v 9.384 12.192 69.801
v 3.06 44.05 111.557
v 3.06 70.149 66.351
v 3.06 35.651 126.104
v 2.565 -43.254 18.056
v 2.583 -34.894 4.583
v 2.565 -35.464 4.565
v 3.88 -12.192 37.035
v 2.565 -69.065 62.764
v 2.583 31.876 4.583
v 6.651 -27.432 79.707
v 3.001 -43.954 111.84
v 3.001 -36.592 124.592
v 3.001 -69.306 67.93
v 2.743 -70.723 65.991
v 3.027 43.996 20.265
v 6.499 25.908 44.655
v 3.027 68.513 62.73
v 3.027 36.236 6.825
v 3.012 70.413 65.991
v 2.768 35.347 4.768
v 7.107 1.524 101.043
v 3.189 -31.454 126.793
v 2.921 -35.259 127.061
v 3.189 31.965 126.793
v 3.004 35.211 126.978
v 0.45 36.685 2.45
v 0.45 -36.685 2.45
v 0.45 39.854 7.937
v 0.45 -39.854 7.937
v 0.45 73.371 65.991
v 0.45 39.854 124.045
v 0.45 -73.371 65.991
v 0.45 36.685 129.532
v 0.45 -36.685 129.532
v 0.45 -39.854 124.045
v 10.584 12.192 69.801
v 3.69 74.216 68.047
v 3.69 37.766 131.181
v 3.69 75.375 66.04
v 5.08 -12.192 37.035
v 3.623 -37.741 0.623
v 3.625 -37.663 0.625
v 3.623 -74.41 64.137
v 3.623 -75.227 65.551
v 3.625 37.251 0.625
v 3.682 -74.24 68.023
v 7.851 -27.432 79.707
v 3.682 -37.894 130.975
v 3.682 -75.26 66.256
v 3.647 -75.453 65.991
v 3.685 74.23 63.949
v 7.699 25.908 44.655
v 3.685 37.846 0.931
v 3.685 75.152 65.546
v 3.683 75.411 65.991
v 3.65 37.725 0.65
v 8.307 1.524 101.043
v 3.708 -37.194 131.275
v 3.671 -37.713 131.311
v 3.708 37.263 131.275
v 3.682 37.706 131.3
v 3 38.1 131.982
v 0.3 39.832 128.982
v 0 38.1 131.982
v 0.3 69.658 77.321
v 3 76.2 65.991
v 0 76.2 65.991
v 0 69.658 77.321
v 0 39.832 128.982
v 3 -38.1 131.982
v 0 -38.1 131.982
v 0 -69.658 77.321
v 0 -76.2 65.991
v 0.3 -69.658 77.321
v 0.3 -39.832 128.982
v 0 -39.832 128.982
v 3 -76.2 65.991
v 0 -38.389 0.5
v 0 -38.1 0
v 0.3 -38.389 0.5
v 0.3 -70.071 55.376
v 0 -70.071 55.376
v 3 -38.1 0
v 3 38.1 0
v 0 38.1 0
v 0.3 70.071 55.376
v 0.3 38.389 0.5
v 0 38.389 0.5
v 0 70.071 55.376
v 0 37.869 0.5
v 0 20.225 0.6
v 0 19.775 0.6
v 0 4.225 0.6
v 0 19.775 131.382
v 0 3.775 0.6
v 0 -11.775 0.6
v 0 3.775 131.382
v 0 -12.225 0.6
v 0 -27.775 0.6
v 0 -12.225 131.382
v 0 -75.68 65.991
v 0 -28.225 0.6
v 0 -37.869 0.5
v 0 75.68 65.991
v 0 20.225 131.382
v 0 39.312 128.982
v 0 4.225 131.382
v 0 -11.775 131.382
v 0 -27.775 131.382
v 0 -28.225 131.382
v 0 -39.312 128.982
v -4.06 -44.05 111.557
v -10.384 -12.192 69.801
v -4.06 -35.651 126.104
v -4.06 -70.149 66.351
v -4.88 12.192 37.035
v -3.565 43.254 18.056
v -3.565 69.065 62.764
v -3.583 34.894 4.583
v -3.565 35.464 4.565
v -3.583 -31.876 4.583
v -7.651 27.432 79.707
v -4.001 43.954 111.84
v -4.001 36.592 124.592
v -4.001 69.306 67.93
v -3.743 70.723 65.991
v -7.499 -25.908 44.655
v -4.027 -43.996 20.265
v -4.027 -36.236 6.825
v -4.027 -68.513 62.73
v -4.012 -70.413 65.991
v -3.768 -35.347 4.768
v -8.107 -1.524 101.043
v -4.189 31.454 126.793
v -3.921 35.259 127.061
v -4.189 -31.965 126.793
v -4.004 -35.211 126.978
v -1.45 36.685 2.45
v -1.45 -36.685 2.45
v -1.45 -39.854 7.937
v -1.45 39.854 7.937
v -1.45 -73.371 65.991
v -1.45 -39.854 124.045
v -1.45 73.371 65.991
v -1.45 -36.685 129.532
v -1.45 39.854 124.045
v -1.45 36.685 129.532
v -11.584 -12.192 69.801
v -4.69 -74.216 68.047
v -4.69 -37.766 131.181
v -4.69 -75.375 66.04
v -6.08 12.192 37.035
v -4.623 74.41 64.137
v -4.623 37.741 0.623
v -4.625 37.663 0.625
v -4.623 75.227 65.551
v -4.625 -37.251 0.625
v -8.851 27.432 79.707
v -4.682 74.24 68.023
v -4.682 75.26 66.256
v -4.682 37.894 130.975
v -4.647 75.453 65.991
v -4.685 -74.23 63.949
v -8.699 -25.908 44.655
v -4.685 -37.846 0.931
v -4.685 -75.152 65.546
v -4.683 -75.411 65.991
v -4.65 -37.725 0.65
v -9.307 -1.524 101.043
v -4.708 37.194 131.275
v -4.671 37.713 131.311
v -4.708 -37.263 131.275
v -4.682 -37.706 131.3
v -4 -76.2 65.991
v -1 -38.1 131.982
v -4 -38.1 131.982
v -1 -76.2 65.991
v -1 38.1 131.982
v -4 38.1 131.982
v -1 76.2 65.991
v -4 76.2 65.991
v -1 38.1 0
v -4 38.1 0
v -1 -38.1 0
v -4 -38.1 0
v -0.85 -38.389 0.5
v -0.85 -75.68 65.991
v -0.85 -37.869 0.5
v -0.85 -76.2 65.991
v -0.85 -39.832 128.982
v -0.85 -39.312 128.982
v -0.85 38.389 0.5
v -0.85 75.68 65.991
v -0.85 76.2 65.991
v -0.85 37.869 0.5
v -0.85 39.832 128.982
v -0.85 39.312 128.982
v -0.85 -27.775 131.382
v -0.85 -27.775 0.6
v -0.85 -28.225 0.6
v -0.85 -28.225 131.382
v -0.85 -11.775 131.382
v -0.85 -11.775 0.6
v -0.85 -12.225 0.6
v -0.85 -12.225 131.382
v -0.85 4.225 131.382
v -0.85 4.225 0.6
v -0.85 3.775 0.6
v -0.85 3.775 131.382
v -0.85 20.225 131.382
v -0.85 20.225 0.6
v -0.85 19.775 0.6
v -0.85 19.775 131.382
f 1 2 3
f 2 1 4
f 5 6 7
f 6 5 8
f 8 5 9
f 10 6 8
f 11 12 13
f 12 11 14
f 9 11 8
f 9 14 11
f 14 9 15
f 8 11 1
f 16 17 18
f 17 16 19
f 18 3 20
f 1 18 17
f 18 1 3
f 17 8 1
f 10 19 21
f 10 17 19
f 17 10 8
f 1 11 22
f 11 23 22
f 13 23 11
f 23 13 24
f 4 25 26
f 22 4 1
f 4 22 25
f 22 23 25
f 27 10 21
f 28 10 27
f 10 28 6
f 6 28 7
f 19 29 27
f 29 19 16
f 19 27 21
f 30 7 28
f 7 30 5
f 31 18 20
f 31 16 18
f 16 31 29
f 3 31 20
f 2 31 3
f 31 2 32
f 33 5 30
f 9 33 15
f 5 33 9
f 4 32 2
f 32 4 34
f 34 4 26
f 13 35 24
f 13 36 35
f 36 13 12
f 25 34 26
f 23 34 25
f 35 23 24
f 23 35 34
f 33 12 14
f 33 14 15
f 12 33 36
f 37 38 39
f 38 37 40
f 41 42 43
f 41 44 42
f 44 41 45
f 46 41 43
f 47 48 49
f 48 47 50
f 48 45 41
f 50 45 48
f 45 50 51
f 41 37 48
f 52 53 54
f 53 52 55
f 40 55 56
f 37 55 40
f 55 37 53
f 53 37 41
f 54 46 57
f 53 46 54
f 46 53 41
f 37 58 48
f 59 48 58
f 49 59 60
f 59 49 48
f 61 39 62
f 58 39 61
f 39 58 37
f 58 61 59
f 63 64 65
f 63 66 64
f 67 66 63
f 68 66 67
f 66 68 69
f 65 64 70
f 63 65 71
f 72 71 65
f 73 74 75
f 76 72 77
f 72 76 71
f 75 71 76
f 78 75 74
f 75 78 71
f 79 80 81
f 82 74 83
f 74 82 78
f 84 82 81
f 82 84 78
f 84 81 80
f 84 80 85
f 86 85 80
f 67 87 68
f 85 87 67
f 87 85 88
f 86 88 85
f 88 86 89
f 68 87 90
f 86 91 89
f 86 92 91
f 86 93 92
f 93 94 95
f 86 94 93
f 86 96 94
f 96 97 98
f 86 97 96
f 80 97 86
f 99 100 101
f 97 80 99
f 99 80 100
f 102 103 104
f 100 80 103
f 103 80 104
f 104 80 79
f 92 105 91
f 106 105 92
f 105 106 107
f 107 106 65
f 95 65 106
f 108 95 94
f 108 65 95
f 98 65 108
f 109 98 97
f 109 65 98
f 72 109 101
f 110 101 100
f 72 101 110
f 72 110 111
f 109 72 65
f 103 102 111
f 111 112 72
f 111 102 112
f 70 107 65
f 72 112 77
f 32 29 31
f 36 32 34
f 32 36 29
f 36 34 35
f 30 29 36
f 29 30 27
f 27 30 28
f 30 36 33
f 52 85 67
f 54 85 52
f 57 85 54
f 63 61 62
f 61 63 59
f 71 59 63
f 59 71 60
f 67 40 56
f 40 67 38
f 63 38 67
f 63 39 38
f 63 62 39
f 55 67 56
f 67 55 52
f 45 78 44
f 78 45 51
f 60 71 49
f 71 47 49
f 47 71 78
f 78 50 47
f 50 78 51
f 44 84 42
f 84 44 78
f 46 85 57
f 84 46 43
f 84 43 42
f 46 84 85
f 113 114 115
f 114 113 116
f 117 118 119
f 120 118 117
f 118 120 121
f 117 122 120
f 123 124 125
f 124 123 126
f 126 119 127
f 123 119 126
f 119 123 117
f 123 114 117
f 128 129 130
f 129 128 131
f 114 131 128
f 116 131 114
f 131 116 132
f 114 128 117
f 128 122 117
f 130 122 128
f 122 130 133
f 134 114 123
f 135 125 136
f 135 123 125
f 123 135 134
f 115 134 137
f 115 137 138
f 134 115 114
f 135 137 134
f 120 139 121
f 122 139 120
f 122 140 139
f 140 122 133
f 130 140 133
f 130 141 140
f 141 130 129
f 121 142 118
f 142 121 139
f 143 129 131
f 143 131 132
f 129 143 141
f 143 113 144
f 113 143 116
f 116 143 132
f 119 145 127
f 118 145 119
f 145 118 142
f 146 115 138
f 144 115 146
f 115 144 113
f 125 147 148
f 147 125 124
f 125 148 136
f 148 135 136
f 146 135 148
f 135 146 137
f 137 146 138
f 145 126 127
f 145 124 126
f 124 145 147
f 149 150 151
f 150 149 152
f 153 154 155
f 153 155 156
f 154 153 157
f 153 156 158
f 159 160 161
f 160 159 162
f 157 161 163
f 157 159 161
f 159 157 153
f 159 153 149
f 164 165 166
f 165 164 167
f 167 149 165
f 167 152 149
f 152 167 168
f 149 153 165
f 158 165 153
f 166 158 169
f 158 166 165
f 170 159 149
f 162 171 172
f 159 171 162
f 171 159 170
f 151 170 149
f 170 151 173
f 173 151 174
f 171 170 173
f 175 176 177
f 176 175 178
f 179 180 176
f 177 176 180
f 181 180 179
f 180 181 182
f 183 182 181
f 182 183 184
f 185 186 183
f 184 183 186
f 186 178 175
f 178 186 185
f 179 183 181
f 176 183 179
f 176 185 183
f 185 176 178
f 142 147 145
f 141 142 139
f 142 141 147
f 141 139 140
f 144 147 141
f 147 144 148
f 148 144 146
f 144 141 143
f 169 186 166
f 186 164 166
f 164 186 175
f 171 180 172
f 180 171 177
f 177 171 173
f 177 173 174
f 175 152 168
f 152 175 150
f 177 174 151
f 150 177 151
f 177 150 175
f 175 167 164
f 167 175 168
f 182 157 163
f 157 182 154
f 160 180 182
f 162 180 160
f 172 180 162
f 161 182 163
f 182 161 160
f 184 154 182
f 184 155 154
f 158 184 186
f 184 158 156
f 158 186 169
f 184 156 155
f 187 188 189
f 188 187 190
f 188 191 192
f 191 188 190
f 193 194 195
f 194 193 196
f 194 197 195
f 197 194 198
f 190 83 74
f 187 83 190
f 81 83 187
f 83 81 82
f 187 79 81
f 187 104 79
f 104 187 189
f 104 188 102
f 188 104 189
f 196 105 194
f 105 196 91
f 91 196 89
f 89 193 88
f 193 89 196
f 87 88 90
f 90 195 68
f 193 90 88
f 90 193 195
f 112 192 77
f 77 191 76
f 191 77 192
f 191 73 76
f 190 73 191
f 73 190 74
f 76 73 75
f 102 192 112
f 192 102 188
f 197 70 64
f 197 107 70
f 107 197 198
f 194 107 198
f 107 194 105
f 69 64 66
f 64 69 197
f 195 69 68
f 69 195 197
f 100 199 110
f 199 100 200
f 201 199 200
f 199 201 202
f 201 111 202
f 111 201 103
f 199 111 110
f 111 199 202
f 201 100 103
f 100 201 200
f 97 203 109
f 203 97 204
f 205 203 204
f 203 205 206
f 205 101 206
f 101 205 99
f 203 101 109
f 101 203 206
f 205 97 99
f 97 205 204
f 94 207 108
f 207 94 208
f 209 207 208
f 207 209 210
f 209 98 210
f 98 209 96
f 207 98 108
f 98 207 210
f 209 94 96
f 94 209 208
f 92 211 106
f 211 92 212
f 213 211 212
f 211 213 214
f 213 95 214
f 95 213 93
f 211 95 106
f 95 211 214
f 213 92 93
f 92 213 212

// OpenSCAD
// Hexagon wall tile v57 — parametric rebuild of v30
// Front: identical low-poly facets to v30 (same facet angles at every size).
// Edge profile: identical on every size (edge depth, rim width) so tiles butt flush.
// Back: six corner pads for 1" (25 mm) double-sided mounting tape.
// v32: tape pads are flat plates hung from the rim with an air gap to the front skin.
// v33: thinner skin + thinner pads so the air gap is 1.4 mm even right at the edges
//      (v32 had only 0.8 mm there and showed marks along the slanted edges).
// v34: snap-off stabilizer fins behind the bottom edge so the tall, thin tile can't tip over
//      while printing. Break them off afterwards (bend sideways) and the back stays flat.
// v35: 0.6 mm 45° chamfer on the front edge (crisp, consistent shadow line between tiles; hides
//      first-layer squish and brim trim marks) + relief_scale to deepen the facets if wanted.
// v37: much smaller breakaway tabs (0.8 x 0.6 mm, every 8 mm) so the fins snap off easily.
// v38: full-height snap-off BRACE FRAME behind the tile: a thin hex ring + X/vertical bars,
//      1 mm behind the back, tied to the tile rim by tiny tabs all the way round (incl. the top).
//      Tile + brace act as a stiff box while printing; the fins now sit on the brace.
//      Peel the brace off after printing — the tabs only touch the back rim.
// v39: PAIR mode (default): two identical tiles printed back-to-back, 0.4 mm apart, so each
//      cradles the other full-height. Only 12 tiny tabs (corners + mid-sides) join the back
//      rims — twist/peel the tiles apart. No brace, no fins, almost no waste. The pair is
//      turned 90° on the bed so the 'back' seam lands on a side edge, not on either face.
// v40: pair tabs spaced evenly every ~pair_tab_pitch mm round the rim on EVERY size. In v39 the
//      tab spacing grew with the tile (3": ~23 mm max gap, 6": ~46 mm, 10": ~79 mm), so the 3" pair
//      printed perfectly but the 6" rims flexed apart between tabs and broke up above mid-height.
//      Now every size has the same tab spacing as a stiff 3" pair (or tighter).
// v42: tabs replaced by one continuous hairline SEAM round the outer edge of the pair gap.
//      Discrete tabs changed the toolpath on every layer that had a tab, leaving a faint line
//      across the tile every ~10 mm of height. With a continuous seam every layer has the same
//      shape, so there is nothing to print differently. Separate the tiles by running a utility
//      knife along the seam line on the edges, then twist apart.
// v43: stiffer tape pads — each pad now grows from the back plane toward the front until it is
//      pad_gap (1.4 mm) from the skin, instead of being a 1 mm plate (the skin stays untouched, so
//      no ghost lines). Larger tiles (>= mid_pad_min_in)
//      get four extra pads at the slanted mid-edges: 10 tape spots on the 10".
// v44: UNIFORM pads. Every pad is the same PAD x PAD tape square, pushed snug into its corner
//      (touching both rims), with only a small 45° gusset beneath it down to the rim so it prints
//      without support. Because a hex corner is the same angle at every size, the 6" and 10" pads
//      are identical in shape and size; the 3" uses the same layout with smaller squares.
//      The 10" adds the same square at the middle of each slanted edge.
// v46: pads are a 1 mm plate with a stiffening LIP round the free edges (like a shallow tray),
//      instead of solid-filled — nearly the stiffness of v44's deep pads at close to v42 print time.
// v47: pair gap 0.4 -> 1.0 mm. At 0.4 mm the squashed back walls of the two tiles touched and
//      fused, so v42-v46 pairs would not come apart. At 1.0 mm only the hairline edge seam joins
//      them: cut it with a utility knife (there is now room for the blade) and they separate.
// v48: seam only on the four SLANTED edges. The top and bottom flat edges are left open (a 1 mm
//      slot), so a putty knife / flat screwdriver can go in and pry the pair open, unzipping the
//      seam. Every layer still crosses the seam at both ends, so the layer shape stays constant.
// v49: "KISS" seam — the seam is printed on ONE tile only and stops seam_kiss short of the other
//      tile's back. The two tiles are never one solid: they only touch where the plastic squashes
//      out, which tacks them lightly (enough to steady them while printing, weak enough to snap by
//      hand). Set seam_kiss = 0 to go back to the fused v48 seam.
// v50: (1) every tape pad gets a 45° pointed top, so pads taper out over many layers instead of
//      ending on one layer. Abrupt pad ends changed the layer time suddenly and left a line across
//      the face (seen at ~14% and ~36% height on the 10").
//      (2) the stiffening lips stay lip_gap (2.5 mm) clear of the skin, not 1.4: near the edges the
//      lips were hugging the skin and ghosting through as ridges parallel to the edge.
// v51: STIFFER, LARGER TAPE PADS without touching the front edge profile:
//      - each tape SQUARE stands pad_proud (1.2 mm) proud of the back rim, so where the tape goes
//        the pad is ~2.2 mm thick (was 1 mm) — roughly 8-10x stiffer. The tile sits on its pads;
//        the rim floats ~1.2 mm + tape thickness off the wall. Support webs stay thin (print time).
//      - pads 30 mm square (fit 1" tape with margin), with a shallow 30° roof instead of a point.
//      - front kept cleaner: pads now stay pad_gap = 1.6 mm from the skin; no lips.
//      - pair gap grows to keep 1 mm between the two tiles' proud pads.
//      - seam now starts right at the bottom corners (no cantilevered start); pry slot along the top.
// v53: seam is FUSED (one printed line) on the two upper slanted edges and stays a light-contact
//      kiss seam on the lower two. The top half is where the pair wobbled (ripples near the top
//      corners); the switch happens at mid-height, where the hex corners already turn.
//      Separate: knife in the top slot, run down both upper edges, twist apart.
// v54: tape squares 0.6 mm proud (was 1.2): ~1.6 mm thick, still ~4x stiffer than v50's 1 mm
//      plates, and about 1 hour less on a 10" pair. Print time goes to the face instead.
// v57: CLOSED BACK + FULL-HEIGHT BREAKAWAY RIBS.
//      - each tile gets a flat back plate (back_t thick, always >= back_gap from the skin), so the
//        tile is a stiff closed box instead of an open shell; tape goes anywhere on the flat back.
//      - the two backs are joined by thin vertical ribs (print direction) every rib_pitch mm across
//        the middle. Each rib runs bed-to-top, so every layer has the same shape (no face lines),
//        and each rib stops rib_kiss short of the partner tile -> they only tack, twist apart.
//      - edge seam is a uniform light-contact seam again (no mid-height change).
// Prints upright on a flat edge with NO supports (every downward edge is 45° or steeper).
//
// Export one size at a time, e.g.:
//   openscad -D size_in=6 -o hex_pair_v57_6in.stl hex_wall_tile_v57.scad

/* [Size] */
size_in       = 6;      // point-to-point width in inches (3, 6, 10 ...)

/* [Edge profile — keep identical across sizes] */
// Space behind the skin at the edge = edge_depth - skin; it must be >= pad_plate + pad_gap + pad_recess.
edge_depth    = 3.6;    // depth of the outer edge, back plane to front face (mm)
rim           = 2.0;    // perimeter wall thickness at the back plane (mm)
front_chamfer = 0.6;    // 45° chamfer on the front edge (mm); 0 = sharp edge

/* [Look] */
relief_scale  = 1.0;    // 1.0 = v30 facets; 1.5 = 50% deeper facets (same edge profile on all sizes)

/* [Front skin] */
skin          = 1.2;    // front skin thickness (mm) — 3 lines at 0.4 mm, same on all sizes

/* [Tape pads] */
tape_width    = 25.4;   // tape width (mm)
pad_margin    = 5;      // extra pad width beyond the tape (mm) -> 30.4 mm pads
pad_max_frac  = 0.45;   // pad never larger than this fraction of the tile radius (keeps 3" usable)
pad_plate     = 1.0;    // pad thickness in front of the back plane (mm), less where the skin is close
pad_proud     = 0;      // pads stand this far behind the back rim (mm) -> extra stiffness, no effect on the front
roof_angle    = 30;     // slope of the pad tops (deg) — tapers the pad end over several mm of height
pad_depth     = 0;         // stiffening lip depth (mm); always stops pad_gap from the skin
lip_gap       = 2.5;    // lips stop this far from the skin (plates keep pad_gap)
pad_lip       = 0.9;    // lip thickness (mm) — two lines
mid_pad_min_in = 8;     // tiles this size or larger also get pads at the four slanted mid-edges
pad_gap       = 1.6;    // minimum air gap between pads and the front skin (mm) — keeps the front clean
pad_recess    = 0;      // pads set back from the rim (mm); >0 lets the rim touch the wall,
                        // but near the edges the plate is then trimmed thinner to keep pad_gap

/* [Print stabilizers (snap off after printing)] */
stabilizers   = false;  // v34-v38 option; not needed in pair mode
fin_count     = 2;      // fins behind the bottom edge, placed symmetrically
fin_thick     = 1.6;    // fin thickness (mm)
fin_height_frac = 0.35; // fin height as a fraction of the tile height
fin_depth_frac  = 0.4;  // fin depth behind the brace as a fraction of fin height
fin_depth_min   = 15;   // (mm)
fin_gap       = 0.5;    // air gap between fin and tile back (mm)
tab_height    = 0.6;    // breakaway tab height (mm, vertical when printing) — 3 layers at 0.2
tab_width     = 0.8;    // breakaway tab width (mm), centred on the fin — 2 lines
tab_pitch     = 8;      // spacing between tabs (mm)

/* [Full-height brace frame (snap off after printing)] */
brace         = false;  // v38 option; not needed in pair mode
brace_gap     = 1.0;    // air gap between tile back and brace (mm)
brace_thick   = 1.6;    // brace thickness (mm)
brace_rim_w   = 4;      // width of the brace's hex ring (mm)
brace_bar_w   = 3;      // width of the X and vertical bars (mm)
brace_tab_pitch = 10;   // spacing of brace tabs along each rim side (mm)
brace_tab     = 0.8;    // brace tab size (mm) — tiny, so the brace peels off

/* [Back-to-back pair (default)] */
pair          = true;
pad_clear     = 1.0;    // air between the two tiles' proud pads (mm)
pair_gap      = pad_clear + 2*pad_proud;   // gap between the two back planes (mm)
pair_tab      = 0.6;    // tab size (mm) — tiny, so the pair twists apart
pair_tab_pitch = 12;    // (v40 tabs, unused when pair_seam_w > 0)
pair_seam_w   = 0.45;   // width of the continuous edge seam bridging the gap (mm) — about one line
seam_kiss     = 0.15;   // gap between the seam tip and the other tile (mm); 0 = fused seam
upper_fused   = false;  // v53: fuse the seam on the two upper slanted edges only
seam_open     = 3;      // leave the seam off this far from the top and bottom flat edges (mm) -> pry slots

/* [Closed back + ribs (v57)] */
closed_back   = true;
back_t        = 0.45;   // back plate thickness (mm) — one 0.4 line (keeps the 10" pair under ~9 h)
back_gap      = 1.6;    // back plate never closer than this to the skin (mm)
ribs          = true;
rib_w         = 0.45;   // rib width (mm) — one line
rib_pitch     = 16;     // rib spacing (mm)
rib_kiss      = 0.15;   // rib stops this far from the partner's back (mm); 0 = fused

/* [Output] */
orient_for_print = true; // stand upright on a flat edge, back facing +Y

/* [Hidden] */
R   = size_in * 25.4 / 2;         // corner radius
AP  = R * cos(30);                // apothem
PAD = min(tape_width + pad_margin, R * pad_max_frac);

// Normalised front geometry from v30 (x, y in units of R; z = relief above edge, units of R)
FP = [[1,0,0],[0.5,0.866025,0],[-0.5,0.866025,0],[-1,0,0],[-0.5,-0.866025,0],[0.5,-0.866025,0],
      [0.16,0.05,0.091654],[-0.16,-0.38,0.019428],[-0.36,0.18,0.05579],[0.34,-0.28,0.053795],[0.02,0.46,0.061766]];
FACES = [[0,6,1],[4,3,7],[5,4,7],[8,3,2],[7,3,8],[7,8,6],[5,9,0],[9,6,0],[9,7,6],[5,7,9],
         [6,8,10],[8,2,10],[6,10,1],[10,2,1],
         [1,12,11,0],[2,13,12,1],[3,14,13,2],[4,15,14,3],[5,16,15,4],[0,11,16,5],
         [11,12,13,14,15,16]];
RELIEF_MAX = 0.091654 * R * relief_scale;
D = edge_depth + RELIEF_MAX + 1;  // max depth used for chamfers

// Solid bounded by the faceted front (shifted by dz) and a flat back at z = zb
module body(dz = 0, zb = 0) {
    pts = concat(
        [for (p = FP) [p[0]*R, p[1]*R, edge_depth + p[2]*R*relief_scale + dz]],
        [for (i = [0:5]) [FP[i][0]*R, FP[i][1]*R, zb]]);
    polyhedron(points = pts, faces = FACES, convexity = 4);
}

module hex2d(apothem) { circle(r = apothem / cos(30), $fn = 6); }

// Back cavity: behind the skin, inside the rim; rim inner faces slope 45° so nothing needs support
module cavity(extra = 0) {
    H  = D + 2;
    a0 = AP - rim - extra + 1;             // apothem at z = -1
    intersection() {
        body(dz = -skin - extra, zb = -1);
        translate([0, 0, -1]) linear_extrude(height = H, scale = (a0 - H) / a0) hex2d(a0);
    }
}

// ---- Uniform tape pads ----------------------------------------------------------------
PA = AP - rim + 0.3;                    // inner apothem used for pads (0.3 mm overlap fuses them to the rim)
PH = PAD / 2;
function nrm(a) = [cos(a), sin(a)];
function lim(a) = PA - PH * (abs(cos(a)) + abs(sin(a)));     // max n.c for an axis-aligned PAD square
// centre of a PAD square snug in the corner at angle t (touches the two rims meeting there)
function corner_c(t) = let(n1 = nrm(t - 30), n2 = nrm(t + 30), b1 = lim(t - 30), b2 = lim(t + 30), d = sin(60))
    [(b1*n2[1] - b2*n1[1]) / d, (n1[0]*b2 - n2[0]*b1) / d];
// centre of a PAD square snug against the middle of the edge whose normal is at angle a
function edge_c(a) = lim(a) * nrm(a);
// downward 45° (or vertical) gusset direction toward the nearest rim below — printed upright, model -y is down
function gdir(t) = (cos(t) > 0.1) ? [1, -1] : (cos(t) < -0.1) ? [-1, -1] : [0, -1];

module pad_sq(c, dir) {
    intersection() {
        hex2d(PA);
        hull() {
            translate(c) square(PAD, center = true);
            translate(c + [0, PAD/2 + PAD/2*tan(roof_angle)]) square(0.01, center = true);   // shallow roof
            translate(c + dir * R) square(PAD, center = true);
        }
    }
}
module pad_fp(k)  { t = 60*k;      pad_sq(corner_c(t), (k == 4 || k == 5) ? [0, -1] : gdir(t)); }
module mid_fp(k)  { a = 30 + 60*k; pad_sq(edge_c(a),   (k == 3 || k == 5) ? [0, -1] : gdir(a)); }

module pad_fps() {
    for (k = [0:5]) pad_fp(k);
    if (size_in >= mid_pad_min_in) for (k = [0, 2, 3, 5]) mid_fp(k);
}
// proud part of one tape square: only the square itself (not its support web), with a 45° ramp
// at its lower edge so, printed upright, it grows out of the plate instead of starting as a ledge
module proud_sq(c) {
    intersection() {
        translate([0, 0, -pad_proud]) linear_extrude(pad_proud + 0.01)
            intersection() {
                hex2d(PA);
                hull() { translate(c) square(PAD, center = true);
                         translate(c + [0, PAD/2 + PAD/2*tan(roof_angle)]) square(0.01, center = true); }
            }
        translate([0, c[1] - PAD/2, 0])
            multmatrix([[1,0,0,0],[0,1,-1,0],[0,0,1,0]]) translate([-2*R, 0, -5]) cube([4*R, 4*R, 10]);
    }
}
module pads() {
    intersection() {                                       // tape plate in front of the back plane, pad_gap from the skin
        body(dz = -skin - pad_gap, zb = -1);
        linear_extrude(pad_plate) pad_fps();
    }
    for (k = [0:5]) proud_sq(corner_c(60*k));              // stiff proud tape squares behind it
    if (size_in >= mid_pad_min_in) for (k = [0, 2, 3, 5]) proud_sq(edge_c(30 + 60*k));
}

module chamfer_clip() {
    HB = D + 5;
    union() {
        translate([0, 0, -2]) linear_extrude(edge_depth - front_chamfer + 2) hex2d(AP + 1);
        translate([0, 0, edge_depth - front_chamfer]) linear_extrude(height = HB, scale = (AP - HB) / AP) hex2d(AP);
    }
}

module tile() {
    intersection() {
        union() {
            difference() { body(); cavity(); }
            if (closed_back) intersection() {                    // flat back plate, clear of the skin
                body(dz = -skin - back_gap, zb = -1);
                linear_extrude(back_t) hex2d(AP - rim + 0.3);
            }
            else pads();
        }
        if (front_chamfer > 0) chamfer_clip(); else translate([-2*R, -2*R, -5]) cube([4*R, 4*R, 4*R]);
    }
}

// Triangular fins standing on the bed behind the back (model z < 0), joined to the tile by small tabs
FIN_H = fin_height_frac * 2 * AP;
FIN_L = max(fin_depth_min, fin_depth_frac * FIN_H);
function fin_x(i) = (fin_count == 1) ? 0 : (-1 + 2 * i / (fin_count - 1)) * 0.35 * R;
BZ = brace ? brace_gap + brace_thick : 0;          // fins start behind the brace when it is used
module stabilizer_fins() {
    for (i = [0 : fin_count - 1]) {
        x = fin_x(i);
        fg = brace ? BZ - 0.3 : fin_gap;                // with a brace: fused into it (no tabs needed)
        hull() {                                            // fin: vertical triangle
            translate([x - fin_thick/2, -AP, -fg - FIN_L]) cube([fin_thick, 0.01, FIN_L]);
            translate([x - fin_thick/2, -AP, -fg - 0.01]) cube([fin_thick, FIN_H, 0.01]);
        }
        if (!brace)
            for (y = [0 : tab_pitch : FIN_H - tab_height])  // breakaway tabs into the back plane
                translate([x - tab_width/2, -AP + y, -fin_gap - 0.05]) cube([tab_width, tab_height, fin_gap + 0.35]);
    }
}

// Brace frame (2D, in the tile plane). Printed upright, so every downward-facing edge is >= 45°:
// the top bar is carried by 45° roofs in the two top windows; bars run vertical or at ±60°.
module brace_2d() {
    W  = brace_rim_w;
    Yt = AP - W;                                        // underside of the top ring bar
    difference() {
        hex2d(AP);
        intersection() {                                // the open window, with a 45° roof under the top bar
            hex2d(AP - W);
            // only the two top windows touch the top bar: give them a 45° valley roof
            polygon([[-2*R, -2*R], [2*R, -2*R], [2*R, 2*R], [R/2, 2*R], [R/2, Yt],
                     [0, Yt - R/2], [-R/2, Yt], [-R/2, 2*R], [-2*R, 2*R]]);
        }
    }
    intersection() {
        hex2d(AP);
        union() {
            square([brace_bar_w, 2*AP], center = true);                 // vertical bar
            rotate(60)  square([4*R, brace_bar_w], center = true);      // ±60° diagonals (corner to corner)
            rotate(-60) square([4*R, brace_bar_w], center = true);
        }
    }
}

module brace_frame() {
    translate([0, 0, -BZ]) linear_extrude(brace_thick) brace_2d();
    // tiny tabs across the gap, on the tile's back rim (1 mm in from the outline), all six sides
    for (k = [0:5]) {
        a0 = 60*k; a1 = 60*(k+1);
        p0 = [ (R - 1/sin(60)) * cos(a0), (R - 1/sin(60)) * sin(a0) ];
        p1 = [ (R - 1/sin(60)) * cos(a1), (R - 1/sin(60)) * sin(a1) ];
        L  = norm(p1 - p0);
        n  = floor((L - 6) / brace_tab_pitch);
        for (j = [0 : n]) {
            t = (3 + j * (L - 6) / max(n, 1)) / L;
            p = p0 + t * (p1 - p0);
            translate([p[0], p[1], -brace_gap - 0.3]) rotate(a0 + 120)
                translate([-brace_tab/2, -brace_tab/2, 0]) cube([brace_tab, brace_tab, brace_gap + 0.6]);
        }
    }
}

// Tabs across the pair gap, evenly spaced along each rim side (1 mm in from the outline)
module pair_tabs() {
    rr = R - 1/sin(60);
    n  = max(2, ceil(rr / pair_tab_pitch));          // side length = rr
    for (k = [0:5]) for (i = [0:n-1]) {
        f  = (i + 0.5) / n;
        a0 = 60*k; a1 = 60*(k+1);
        p = [rr*cos(a0), rr*sin(a0)] + f * ([rr*cos(a1), rr*sin(a1)] - [rr*cos(a0), rr*sin(a0)]);
        translate([p[0], p[1], -pair_gap - 0.3]) rotate(a0 + 120)
            translate([-pair_tab/2, -pair_tab/2, 0]) cube([pair_tab, pair_tab, pair_gap + 0.6]);
    }
}
// Continuous hairline seam round the outline, bridging the gap between the two back planes
// Seam strip along the slanted edges, between z0 (partner side) and +0.3 (into this tile)
module seam_strip(z0, ylo, yhi) {
    translate([0, 0, z0]) linear_extrude(0.3 - z0)
        intersection() {
            difference() { hex2d(AP); hex2d(AP - pair_seam_w); }
            translate([-2*R, ylo]) square([4*R, yhi - ylo]);
        }
}
module pair_seam() {
    ybot = -AP + pair_seam_w + 0.05;       // just off the bed (bottom corners)
    ytop =  AP - seam_open;                // top pry slot
    // lower half: light-contact "kiss" seam (stops seam_kiss short of the partner)
    seam_strip((seam_kiss > 0) ? -pair_gap + seam_kiss : -pair_gap - 0.3, ybot, 0);
    // upper half: fused hairline seam (one printed line) — braces the top, where the pair wobbles
    seam_strip(upper_fused ? -pair_gap - 0.3 : -pair_gap + seam_kiss, 0, ytop);
}
module partner() { translate([0, 0, -pair_gap]) rotate([0, 180, 0]) tile(); }   // same tile turned round, not mirrored

// full-height ribs across the gap, attached to this tile only, kissing the partner
module pair_ribs() {
    n = floor((R/2 - 4) / rib_pitch);
    for (i = [-n:n]) {
        x = i * rib_pitch + rib_pitch/4;                      // offset so ribs are not symmetric
        if (abs(x) < R/2 - 4)
            translate([x - rib_w/2, -AP + 0.6, -pair_gap + rib_kiss])
                cube([rib_w, 2*AP - 1.2, pair_gap - rib_kiss + 0.3]);
    }
}
module assembly() {
    tile();
    if (pair) { partner(); if (pair_seam_w > 0) pair_seam(); else pair_tabs(); if (ribs) pair_ribs(); }
    else { if (brace) brace_frame(); if (stabilizers) stabilizer_fins(); }
}

if (orient_for_print)
    rotate([0, 0, pair ? 90 : 0]) translate([0, 0, AP]) rotate([90, 0, 0]) assembly();
else
    assembly();
